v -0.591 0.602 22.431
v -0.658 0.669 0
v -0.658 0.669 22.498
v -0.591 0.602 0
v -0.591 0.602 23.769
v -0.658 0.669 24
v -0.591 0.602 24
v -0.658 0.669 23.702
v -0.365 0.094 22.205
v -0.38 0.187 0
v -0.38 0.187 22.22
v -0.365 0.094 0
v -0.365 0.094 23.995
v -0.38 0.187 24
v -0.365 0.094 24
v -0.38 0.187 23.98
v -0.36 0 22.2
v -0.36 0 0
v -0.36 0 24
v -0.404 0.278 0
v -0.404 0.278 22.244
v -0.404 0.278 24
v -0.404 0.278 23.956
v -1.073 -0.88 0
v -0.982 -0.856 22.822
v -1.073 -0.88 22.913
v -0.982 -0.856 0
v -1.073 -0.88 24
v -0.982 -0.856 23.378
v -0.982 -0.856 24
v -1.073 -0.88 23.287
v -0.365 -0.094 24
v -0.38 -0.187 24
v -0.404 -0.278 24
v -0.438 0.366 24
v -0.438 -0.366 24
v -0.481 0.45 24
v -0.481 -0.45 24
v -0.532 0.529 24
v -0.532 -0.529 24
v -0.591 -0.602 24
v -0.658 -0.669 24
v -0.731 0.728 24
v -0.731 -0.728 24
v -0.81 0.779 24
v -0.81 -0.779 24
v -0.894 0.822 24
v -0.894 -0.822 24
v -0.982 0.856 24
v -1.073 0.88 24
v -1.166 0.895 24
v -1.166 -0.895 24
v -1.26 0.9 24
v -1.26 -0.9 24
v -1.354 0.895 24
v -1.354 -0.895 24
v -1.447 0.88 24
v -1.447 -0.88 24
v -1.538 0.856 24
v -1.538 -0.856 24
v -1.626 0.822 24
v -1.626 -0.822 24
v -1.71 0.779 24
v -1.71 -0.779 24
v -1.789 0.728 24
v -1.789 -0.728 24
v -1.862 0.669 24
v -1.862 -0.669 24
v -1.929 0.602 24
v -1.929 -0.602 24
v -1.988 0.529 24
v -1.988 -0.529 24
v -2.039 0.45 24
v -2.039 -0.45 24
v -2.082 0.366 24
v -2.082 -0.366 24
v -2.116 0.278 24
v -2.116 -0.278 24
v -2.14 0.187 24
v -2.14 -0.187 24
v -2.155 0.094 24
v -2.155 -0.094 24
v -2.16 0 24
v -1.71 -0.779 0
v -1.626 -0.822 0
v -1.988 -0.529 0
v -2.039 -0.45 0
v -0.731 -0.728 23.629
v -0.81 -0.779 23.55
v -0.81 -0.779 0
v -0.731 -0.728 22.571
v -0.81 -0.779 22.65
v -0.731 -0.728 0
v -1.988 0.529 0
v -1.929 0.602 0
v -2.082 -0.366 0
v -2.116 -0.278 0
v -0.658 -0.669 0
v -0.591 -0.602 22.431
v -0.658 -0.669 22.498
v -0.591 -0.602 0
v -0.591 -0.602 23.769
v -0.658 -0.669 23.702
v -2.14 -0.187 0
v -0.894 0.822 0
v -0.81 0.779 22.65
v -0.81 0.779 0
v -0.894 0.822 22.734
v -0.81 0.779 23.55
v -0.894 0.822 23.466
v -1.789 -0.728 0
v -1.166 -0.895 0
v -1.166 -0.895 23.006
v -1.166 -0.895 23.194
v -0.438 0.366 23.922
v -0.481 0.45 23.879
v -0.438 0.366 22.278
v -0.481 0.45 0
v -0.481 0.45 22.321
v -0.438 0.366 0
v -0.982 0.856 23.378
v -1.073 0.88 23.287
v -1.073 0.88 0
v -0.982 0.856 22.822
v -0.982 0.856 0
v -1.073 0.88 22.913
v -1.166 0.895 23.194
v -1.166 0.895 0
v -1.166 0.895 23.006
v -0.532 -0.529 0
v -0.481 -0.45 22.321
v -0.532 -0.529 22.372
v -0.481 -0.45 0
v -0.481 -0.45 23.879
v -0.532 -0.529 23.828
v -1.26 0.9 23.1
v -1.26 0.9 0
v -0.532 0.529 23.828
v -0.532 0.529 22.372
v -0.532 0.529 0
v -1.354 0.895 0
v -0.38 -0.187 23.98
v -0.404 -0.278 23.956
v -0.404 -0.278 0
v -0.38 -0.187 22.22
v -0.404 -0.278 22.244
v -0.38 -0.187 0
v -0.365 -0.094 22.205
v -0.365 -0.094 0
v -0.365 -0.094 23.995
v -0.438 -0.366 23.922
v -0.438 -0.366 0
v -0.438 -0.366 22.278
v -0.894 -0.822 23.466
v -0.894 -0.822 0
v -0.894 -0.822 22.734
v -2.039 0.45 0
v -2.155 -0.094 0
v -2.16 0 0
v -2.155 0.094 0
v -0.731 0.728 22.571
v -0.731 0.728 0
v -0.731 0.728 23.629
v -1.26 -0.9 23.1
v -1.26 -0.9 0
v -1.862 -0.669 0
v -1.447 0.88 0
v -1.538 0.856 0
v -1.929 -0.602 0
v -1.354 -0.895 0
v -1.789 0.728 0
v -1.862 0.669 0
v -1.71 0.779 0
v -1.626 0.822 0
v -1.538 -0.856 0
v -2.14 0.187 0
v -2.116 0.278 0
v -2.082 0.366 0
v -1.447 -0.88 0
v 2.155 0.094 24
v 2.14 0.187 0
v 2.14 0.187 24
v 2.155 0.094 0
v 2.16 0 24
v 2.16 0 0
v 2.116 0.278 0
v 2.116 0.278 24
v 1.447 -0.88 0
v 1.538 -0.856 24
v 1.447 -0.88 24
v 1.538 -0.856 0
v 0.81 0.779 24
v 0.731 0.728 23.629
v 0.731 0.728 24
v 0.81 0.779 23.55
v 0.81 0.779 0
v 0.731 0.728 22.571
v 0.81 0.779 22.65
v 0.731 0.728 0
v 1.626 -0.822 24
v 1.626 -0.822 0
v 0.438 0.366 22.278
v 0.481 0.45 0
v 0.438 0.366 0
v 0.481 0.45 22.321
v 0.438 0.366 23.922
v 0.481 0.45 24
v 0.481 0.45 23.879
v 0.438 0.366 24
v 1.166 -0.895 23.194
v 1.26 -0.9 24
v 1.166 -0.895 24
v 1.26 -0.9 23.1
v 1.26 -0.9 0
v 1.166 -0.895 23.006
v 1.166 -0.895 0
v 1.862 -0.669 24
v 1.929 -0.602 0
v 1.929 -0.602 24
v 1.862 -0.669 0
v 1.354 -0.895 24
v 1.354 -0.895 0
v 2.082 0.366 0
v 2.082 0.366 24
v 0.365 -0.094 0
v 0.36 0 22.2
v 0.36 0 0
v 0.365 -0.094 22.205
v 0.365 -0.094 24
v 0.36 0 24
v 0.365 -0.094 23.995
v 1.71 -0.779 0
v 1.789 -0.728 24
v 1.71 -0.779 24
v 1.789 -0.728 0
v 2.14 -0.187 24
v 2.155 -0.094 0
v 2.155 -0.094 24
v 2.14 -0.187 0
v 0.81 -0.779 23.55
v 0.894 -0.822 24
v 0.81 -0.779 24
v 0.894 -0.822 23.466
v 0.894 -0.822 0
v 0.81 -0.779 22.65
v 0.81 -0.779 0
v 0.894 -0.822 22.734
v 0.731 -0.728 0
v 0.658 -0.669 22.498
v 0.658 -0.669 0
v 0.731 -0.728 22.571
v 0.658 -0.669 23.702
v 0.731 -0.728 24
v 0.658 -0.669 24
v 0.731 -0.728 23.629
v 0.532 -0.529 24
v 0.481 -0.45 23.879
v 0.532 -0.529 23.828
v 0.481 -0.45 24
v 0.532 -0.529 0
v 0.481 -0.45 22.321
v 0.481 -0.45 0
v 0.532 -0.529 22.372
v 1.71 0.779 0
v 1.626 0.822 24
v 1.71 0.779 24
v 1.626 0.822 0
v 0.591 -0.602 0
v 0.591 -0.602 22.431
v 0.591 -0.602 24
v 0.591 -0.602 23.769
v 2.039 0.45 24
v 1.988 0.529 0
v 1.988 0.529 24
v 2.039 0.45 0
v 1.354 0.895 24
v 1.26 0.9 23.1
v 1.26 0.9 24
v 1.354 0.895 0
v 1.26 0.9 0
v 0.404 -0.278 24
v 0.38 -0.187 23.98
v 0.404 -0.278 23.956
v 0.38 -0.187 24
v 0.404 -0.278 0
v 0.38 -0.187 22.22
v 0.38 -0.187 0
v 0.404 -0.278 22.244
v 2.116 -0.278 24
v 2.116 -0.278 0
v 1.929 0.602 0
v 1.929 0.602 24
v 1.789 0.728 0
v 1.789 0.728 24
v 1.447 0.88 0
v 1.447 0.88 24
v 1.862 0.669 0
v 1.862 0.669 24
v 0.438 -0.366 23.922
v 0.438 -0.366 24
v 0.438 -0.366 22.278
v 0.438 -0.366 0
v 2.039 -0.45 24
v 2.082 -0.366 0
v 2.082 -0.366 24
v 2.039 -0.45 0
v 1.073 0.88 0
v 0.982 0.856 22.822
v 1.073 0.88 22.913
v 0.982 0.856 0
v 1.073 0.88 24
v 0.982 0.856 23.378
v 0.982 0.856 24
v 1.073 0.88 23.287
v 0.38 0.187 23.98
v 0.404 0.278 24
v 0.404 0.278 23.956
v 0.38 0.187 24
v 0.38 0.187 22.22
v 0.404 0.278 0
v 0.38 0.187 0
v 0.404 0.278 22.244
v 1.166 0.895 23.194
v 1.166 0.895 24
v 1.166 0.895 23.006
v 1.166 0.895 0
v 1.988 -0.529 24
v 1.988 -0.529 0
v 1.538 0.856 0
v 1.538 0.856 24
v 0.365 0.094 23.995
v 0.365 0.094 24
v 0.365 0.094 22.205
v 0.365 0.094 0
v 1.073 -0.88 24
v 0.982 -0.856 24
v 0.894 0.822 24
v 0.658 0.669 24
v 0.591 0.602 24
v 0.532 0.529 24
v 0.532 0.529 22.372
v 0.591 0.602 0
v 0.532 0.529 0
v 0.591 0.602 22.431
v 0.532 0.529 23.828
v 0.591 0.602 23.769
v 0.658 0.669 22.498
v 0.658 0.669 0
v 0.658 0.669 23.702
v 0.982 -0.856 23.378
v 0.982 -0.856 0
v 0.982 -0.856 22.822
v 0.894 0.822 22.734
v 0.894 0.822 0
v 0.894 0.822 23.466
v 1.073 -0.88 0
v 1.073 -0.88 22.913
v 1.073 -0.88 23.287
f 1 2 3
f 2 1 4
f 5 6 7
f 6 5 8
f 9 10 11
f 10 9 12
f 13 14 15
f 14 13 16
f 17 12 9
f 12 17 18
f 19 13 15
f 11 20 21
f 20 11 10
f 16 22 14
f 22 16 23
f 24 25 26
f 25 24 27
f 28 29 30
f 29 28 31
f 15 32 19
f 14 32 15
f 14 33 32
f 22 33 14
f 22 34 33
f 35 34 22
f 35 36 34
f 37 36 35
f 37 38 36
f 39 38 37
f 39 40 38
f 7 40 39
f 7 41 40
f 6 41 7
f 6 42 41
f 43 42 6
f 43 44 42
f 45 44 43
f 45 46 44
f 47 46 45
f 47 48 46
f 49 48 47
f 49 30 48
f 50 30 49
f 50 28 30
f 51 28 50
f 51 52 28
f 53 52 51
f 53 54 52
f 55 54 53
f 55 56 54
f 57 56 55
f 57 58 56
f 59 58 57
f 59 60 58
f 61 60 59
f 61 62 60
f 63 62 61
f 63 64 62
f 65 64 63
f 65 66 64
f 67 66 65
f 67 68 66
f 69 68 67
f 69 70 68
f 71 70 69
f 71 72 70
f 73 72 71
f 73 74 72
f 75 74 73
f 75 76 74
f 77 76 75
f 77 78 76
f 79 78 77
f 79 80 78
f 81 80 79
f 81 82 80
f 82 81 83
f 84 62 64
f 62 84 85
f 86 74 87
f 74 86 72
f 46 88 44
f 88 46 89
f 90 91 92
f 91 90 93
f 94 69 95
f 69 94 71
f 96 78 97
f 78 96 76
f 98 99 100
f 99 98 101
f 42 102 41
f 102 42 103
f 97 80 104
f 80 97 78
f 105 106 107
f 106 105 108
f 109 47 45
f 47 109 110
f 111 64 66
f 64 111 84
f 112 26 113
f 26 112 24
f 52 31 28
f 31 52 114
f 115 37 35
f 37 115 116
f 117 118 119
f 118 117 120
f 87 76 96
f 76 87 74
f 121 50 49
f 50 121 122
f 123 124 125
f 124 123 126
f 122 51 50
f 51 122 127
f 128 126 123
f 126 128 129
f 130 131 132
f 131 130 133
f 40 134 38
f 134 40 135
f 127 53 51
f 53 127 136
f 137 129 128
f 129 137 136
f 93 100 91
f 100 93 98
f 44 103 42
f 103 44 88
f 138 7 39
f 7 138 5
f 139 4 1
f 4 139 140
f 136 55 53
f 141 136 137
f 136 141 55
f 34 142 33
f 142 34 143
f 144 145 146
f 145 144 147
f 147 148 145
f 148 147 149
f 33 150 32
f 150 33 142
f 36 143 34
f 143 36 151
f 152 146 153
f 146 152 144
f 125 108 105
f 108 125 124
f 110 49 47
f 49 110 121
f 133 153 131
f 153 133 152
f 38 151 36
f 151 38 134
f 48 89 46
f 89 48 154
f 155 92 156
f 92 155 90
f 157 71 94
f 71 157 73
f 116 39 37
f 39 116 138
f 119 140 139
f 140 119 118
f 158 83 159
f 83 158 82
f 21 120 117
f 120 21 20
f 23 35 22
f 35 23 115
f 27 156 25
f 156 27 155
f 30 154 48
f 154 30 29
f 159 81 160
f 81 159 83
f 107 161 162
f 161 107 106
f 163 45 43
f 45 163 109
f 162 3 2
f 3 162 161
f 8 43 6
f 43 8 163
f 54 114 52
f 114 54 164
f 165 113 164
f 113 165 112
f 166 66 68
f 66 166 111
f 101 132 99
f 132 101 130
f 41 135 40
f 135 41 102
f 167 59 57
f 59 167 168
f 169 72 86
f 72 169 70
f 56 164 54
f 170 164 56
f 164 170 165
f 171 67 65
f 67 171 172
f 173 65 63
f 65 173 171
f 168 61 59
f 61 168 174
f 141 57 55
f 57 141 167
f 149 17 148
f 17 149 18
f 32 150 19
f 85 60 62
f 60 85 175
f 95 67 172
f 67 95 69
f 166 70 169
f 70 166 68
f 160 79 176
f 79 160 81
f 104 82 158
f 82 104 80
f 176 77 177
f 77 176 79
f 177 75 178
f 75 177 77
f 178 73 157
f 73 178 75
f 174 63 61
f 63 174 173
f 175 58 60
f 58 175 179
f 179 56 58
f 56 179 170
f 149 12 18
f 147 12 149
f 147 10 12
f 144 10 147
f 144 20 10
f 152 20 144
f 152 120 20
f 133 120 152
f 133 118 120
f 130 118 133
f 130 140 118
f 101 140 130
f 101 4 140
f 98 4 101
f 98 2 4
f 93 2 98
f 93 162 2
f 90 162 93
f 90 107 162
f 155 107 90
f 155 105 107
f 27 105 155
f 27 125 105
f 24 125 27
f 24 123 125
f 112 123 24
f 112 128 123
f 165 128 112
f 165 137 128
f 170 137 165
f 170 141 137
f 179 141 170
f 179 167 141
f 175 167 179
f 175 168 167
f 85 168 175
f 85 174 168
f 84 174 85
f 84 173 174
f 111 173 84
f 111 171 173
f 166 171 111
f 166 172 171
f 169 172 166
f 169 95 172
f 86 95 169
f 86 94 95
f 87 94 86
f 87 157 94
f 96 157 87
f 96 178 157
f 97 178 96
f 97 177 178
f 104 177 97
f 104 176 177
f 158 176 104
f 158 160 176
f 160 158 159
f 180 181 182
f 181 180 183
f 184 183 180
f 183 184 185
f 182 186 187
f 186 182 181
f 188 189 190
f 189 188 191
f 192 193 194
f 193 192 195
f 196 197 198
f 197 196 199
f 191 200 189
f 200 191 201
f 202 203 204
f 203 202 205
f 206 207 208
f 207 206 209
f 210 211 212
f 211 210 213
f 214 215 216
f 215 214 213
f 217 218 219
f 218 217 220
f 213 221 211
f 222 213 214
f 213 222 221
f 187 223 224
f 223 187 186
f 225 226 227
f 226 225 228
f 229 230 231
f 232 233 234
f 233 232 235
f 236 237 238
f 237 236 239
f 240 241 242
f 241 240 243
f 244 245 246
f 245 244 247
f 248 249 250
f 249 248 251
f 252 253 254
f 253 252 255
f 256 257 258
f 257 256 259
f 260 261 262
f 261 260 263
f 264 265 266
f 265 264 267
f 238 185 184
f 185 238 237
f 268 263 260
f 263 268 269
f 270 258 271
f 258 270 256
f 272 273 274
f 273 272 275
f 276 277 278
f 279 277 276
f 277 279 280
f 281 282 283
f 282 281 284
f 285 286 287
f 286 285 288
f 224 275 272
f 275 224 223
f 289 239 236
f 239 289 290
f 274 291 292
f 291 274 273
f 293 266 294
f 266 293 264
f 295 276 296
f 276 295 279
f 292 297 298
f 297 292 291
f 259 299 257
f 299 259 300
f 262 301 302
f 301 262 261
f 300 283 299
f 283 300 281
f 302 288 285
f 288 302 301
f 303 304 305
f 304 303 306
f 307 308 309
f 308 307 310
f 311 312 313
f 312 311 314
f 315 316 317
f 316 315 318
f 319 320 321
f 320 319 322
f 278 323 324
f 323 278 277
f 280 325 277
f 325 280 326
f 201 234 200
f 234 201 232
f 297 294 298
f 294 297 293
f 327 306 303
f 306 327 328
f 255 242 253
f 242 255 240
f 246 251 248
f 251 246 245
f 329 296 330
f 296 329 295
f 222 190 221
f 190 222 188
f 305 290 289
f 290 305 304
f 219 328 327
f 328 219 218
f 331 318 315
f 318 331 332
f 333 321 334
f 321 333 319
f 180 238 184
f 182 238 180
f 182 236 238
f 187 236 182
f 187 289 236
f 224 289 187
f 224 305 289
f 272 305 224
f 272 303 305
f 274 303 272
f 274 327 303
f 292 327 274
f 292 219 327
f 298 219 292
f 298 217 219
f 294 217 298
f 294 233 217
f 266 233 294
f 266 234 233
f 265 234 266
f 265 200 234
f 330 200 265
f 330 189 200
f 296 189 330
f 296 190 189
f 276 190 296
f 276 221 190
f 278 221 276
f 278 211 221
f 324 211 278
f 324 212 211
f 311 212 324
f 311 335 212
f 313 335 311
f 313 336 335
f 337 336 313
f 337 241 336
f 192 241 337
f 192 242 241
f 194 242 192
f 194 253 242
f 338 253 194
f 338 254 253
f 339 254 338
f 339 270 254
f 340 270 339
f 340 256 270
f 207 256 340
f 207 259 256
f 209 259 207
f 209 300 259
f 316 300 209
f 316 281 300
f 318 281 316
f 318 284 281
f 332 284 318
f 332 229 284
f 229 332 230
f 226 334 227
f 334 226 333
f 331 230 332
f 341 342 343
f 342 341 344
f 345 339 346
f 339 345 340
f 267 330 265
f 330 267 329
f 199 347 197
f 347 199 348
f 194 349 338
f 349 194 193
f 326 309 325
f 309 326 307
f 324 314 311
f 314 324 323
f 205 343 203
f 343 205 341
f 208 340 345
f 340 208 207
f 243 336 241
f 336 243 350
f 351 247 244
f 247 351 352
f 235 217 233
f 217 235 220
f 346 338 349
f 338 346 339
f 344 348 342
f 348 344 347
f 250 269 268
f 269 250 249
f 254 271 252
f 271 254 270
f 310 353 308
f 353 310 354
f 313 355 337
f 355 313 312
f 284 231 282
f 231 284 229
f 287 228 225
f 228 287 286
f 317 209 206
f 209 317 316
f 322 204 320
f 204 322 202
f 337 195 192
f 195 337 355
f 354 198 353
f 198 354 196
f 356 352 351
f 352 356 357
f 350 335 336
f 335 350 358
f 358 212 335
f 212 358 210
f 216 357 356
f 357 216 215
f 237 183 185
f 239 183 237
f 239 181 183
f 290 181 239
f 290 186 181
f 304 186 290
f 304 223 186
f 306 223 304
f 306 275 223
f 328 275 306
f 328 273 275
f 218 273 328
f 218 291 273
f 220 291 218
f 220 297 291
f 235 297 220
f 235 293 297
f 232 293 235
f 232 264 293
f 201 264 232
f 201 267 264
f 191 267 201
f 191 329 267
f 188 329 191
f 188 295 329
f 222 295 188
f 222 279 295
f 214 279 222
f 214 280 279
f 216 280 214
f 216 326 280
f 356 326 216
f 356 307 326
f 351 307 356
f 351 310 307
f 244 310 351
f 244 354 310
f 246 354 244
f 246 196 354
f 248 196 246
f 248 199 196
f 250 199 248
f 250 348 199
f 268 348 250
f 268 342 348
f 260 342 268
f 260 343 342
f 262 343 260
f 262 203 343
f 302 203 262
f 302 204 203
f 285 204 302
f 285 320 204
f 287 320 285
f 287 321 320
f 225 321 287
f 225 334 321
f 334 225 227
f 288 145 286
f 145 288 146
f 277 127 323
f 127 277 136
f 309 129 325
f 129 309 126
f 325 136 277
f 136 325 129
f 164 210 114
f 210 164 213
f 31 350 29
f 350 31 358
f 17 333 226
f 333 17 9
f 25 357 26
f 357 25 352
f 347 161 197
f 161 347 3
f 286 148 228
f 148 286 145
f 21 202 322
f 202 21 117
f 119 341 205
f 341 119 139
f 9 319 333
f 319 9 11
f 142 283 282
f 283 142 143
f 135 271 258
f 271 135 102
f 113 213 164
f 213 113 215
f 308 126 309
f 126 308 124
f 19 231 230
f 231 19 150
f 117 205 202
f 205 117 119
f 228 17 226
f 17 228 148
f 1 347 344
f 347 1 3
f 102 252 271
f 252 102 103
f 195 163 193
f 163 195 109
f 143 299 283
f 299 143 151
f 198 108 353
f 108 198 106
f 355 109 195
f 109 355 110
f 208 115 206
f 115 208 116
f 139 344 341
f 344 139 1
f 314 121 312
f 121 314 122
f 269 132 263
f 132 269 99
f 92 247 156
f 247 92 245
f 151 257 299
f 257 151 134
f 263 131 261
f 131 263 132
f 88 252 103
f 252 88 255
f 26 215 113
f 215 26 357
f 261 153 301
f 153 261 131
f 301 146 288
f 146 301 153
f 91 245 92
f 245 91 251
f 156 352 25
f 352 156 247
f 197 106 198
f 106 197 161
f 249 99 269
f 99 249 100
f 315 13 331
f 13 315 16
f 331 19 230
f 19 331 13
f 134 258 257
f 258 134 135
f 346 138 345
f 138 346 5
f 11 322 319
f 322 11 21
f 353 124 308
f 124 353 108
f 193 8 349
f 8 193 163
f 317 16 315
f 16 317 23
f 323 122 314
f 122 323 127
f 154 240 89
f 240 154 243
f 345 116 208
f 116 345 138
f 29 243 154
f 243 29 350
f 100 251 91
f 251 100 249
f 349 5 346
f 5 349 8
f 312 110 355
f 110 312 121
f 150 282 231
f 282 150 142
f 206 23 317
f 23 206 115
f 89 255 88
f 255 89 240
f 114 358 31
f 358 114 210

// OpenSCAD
// Two-prong cotter pin.
$fn = 60;
eps = 0.02;
wire_d = 1.8;
length = 24;
prong_gap = wire_d*1.4;
union() {
    translate([-prong_gap/2,0,0]) cylinder(d=wire_d,h=length);
    translate([prong_gap/2,0,0]) cylinder(d=wire_d,h=length);
    translate([-prong_gap/2,0,length-wire_d/2]) rotate([0,90,0]) cylinder(d=wire_d,h=prong_gap);
}
